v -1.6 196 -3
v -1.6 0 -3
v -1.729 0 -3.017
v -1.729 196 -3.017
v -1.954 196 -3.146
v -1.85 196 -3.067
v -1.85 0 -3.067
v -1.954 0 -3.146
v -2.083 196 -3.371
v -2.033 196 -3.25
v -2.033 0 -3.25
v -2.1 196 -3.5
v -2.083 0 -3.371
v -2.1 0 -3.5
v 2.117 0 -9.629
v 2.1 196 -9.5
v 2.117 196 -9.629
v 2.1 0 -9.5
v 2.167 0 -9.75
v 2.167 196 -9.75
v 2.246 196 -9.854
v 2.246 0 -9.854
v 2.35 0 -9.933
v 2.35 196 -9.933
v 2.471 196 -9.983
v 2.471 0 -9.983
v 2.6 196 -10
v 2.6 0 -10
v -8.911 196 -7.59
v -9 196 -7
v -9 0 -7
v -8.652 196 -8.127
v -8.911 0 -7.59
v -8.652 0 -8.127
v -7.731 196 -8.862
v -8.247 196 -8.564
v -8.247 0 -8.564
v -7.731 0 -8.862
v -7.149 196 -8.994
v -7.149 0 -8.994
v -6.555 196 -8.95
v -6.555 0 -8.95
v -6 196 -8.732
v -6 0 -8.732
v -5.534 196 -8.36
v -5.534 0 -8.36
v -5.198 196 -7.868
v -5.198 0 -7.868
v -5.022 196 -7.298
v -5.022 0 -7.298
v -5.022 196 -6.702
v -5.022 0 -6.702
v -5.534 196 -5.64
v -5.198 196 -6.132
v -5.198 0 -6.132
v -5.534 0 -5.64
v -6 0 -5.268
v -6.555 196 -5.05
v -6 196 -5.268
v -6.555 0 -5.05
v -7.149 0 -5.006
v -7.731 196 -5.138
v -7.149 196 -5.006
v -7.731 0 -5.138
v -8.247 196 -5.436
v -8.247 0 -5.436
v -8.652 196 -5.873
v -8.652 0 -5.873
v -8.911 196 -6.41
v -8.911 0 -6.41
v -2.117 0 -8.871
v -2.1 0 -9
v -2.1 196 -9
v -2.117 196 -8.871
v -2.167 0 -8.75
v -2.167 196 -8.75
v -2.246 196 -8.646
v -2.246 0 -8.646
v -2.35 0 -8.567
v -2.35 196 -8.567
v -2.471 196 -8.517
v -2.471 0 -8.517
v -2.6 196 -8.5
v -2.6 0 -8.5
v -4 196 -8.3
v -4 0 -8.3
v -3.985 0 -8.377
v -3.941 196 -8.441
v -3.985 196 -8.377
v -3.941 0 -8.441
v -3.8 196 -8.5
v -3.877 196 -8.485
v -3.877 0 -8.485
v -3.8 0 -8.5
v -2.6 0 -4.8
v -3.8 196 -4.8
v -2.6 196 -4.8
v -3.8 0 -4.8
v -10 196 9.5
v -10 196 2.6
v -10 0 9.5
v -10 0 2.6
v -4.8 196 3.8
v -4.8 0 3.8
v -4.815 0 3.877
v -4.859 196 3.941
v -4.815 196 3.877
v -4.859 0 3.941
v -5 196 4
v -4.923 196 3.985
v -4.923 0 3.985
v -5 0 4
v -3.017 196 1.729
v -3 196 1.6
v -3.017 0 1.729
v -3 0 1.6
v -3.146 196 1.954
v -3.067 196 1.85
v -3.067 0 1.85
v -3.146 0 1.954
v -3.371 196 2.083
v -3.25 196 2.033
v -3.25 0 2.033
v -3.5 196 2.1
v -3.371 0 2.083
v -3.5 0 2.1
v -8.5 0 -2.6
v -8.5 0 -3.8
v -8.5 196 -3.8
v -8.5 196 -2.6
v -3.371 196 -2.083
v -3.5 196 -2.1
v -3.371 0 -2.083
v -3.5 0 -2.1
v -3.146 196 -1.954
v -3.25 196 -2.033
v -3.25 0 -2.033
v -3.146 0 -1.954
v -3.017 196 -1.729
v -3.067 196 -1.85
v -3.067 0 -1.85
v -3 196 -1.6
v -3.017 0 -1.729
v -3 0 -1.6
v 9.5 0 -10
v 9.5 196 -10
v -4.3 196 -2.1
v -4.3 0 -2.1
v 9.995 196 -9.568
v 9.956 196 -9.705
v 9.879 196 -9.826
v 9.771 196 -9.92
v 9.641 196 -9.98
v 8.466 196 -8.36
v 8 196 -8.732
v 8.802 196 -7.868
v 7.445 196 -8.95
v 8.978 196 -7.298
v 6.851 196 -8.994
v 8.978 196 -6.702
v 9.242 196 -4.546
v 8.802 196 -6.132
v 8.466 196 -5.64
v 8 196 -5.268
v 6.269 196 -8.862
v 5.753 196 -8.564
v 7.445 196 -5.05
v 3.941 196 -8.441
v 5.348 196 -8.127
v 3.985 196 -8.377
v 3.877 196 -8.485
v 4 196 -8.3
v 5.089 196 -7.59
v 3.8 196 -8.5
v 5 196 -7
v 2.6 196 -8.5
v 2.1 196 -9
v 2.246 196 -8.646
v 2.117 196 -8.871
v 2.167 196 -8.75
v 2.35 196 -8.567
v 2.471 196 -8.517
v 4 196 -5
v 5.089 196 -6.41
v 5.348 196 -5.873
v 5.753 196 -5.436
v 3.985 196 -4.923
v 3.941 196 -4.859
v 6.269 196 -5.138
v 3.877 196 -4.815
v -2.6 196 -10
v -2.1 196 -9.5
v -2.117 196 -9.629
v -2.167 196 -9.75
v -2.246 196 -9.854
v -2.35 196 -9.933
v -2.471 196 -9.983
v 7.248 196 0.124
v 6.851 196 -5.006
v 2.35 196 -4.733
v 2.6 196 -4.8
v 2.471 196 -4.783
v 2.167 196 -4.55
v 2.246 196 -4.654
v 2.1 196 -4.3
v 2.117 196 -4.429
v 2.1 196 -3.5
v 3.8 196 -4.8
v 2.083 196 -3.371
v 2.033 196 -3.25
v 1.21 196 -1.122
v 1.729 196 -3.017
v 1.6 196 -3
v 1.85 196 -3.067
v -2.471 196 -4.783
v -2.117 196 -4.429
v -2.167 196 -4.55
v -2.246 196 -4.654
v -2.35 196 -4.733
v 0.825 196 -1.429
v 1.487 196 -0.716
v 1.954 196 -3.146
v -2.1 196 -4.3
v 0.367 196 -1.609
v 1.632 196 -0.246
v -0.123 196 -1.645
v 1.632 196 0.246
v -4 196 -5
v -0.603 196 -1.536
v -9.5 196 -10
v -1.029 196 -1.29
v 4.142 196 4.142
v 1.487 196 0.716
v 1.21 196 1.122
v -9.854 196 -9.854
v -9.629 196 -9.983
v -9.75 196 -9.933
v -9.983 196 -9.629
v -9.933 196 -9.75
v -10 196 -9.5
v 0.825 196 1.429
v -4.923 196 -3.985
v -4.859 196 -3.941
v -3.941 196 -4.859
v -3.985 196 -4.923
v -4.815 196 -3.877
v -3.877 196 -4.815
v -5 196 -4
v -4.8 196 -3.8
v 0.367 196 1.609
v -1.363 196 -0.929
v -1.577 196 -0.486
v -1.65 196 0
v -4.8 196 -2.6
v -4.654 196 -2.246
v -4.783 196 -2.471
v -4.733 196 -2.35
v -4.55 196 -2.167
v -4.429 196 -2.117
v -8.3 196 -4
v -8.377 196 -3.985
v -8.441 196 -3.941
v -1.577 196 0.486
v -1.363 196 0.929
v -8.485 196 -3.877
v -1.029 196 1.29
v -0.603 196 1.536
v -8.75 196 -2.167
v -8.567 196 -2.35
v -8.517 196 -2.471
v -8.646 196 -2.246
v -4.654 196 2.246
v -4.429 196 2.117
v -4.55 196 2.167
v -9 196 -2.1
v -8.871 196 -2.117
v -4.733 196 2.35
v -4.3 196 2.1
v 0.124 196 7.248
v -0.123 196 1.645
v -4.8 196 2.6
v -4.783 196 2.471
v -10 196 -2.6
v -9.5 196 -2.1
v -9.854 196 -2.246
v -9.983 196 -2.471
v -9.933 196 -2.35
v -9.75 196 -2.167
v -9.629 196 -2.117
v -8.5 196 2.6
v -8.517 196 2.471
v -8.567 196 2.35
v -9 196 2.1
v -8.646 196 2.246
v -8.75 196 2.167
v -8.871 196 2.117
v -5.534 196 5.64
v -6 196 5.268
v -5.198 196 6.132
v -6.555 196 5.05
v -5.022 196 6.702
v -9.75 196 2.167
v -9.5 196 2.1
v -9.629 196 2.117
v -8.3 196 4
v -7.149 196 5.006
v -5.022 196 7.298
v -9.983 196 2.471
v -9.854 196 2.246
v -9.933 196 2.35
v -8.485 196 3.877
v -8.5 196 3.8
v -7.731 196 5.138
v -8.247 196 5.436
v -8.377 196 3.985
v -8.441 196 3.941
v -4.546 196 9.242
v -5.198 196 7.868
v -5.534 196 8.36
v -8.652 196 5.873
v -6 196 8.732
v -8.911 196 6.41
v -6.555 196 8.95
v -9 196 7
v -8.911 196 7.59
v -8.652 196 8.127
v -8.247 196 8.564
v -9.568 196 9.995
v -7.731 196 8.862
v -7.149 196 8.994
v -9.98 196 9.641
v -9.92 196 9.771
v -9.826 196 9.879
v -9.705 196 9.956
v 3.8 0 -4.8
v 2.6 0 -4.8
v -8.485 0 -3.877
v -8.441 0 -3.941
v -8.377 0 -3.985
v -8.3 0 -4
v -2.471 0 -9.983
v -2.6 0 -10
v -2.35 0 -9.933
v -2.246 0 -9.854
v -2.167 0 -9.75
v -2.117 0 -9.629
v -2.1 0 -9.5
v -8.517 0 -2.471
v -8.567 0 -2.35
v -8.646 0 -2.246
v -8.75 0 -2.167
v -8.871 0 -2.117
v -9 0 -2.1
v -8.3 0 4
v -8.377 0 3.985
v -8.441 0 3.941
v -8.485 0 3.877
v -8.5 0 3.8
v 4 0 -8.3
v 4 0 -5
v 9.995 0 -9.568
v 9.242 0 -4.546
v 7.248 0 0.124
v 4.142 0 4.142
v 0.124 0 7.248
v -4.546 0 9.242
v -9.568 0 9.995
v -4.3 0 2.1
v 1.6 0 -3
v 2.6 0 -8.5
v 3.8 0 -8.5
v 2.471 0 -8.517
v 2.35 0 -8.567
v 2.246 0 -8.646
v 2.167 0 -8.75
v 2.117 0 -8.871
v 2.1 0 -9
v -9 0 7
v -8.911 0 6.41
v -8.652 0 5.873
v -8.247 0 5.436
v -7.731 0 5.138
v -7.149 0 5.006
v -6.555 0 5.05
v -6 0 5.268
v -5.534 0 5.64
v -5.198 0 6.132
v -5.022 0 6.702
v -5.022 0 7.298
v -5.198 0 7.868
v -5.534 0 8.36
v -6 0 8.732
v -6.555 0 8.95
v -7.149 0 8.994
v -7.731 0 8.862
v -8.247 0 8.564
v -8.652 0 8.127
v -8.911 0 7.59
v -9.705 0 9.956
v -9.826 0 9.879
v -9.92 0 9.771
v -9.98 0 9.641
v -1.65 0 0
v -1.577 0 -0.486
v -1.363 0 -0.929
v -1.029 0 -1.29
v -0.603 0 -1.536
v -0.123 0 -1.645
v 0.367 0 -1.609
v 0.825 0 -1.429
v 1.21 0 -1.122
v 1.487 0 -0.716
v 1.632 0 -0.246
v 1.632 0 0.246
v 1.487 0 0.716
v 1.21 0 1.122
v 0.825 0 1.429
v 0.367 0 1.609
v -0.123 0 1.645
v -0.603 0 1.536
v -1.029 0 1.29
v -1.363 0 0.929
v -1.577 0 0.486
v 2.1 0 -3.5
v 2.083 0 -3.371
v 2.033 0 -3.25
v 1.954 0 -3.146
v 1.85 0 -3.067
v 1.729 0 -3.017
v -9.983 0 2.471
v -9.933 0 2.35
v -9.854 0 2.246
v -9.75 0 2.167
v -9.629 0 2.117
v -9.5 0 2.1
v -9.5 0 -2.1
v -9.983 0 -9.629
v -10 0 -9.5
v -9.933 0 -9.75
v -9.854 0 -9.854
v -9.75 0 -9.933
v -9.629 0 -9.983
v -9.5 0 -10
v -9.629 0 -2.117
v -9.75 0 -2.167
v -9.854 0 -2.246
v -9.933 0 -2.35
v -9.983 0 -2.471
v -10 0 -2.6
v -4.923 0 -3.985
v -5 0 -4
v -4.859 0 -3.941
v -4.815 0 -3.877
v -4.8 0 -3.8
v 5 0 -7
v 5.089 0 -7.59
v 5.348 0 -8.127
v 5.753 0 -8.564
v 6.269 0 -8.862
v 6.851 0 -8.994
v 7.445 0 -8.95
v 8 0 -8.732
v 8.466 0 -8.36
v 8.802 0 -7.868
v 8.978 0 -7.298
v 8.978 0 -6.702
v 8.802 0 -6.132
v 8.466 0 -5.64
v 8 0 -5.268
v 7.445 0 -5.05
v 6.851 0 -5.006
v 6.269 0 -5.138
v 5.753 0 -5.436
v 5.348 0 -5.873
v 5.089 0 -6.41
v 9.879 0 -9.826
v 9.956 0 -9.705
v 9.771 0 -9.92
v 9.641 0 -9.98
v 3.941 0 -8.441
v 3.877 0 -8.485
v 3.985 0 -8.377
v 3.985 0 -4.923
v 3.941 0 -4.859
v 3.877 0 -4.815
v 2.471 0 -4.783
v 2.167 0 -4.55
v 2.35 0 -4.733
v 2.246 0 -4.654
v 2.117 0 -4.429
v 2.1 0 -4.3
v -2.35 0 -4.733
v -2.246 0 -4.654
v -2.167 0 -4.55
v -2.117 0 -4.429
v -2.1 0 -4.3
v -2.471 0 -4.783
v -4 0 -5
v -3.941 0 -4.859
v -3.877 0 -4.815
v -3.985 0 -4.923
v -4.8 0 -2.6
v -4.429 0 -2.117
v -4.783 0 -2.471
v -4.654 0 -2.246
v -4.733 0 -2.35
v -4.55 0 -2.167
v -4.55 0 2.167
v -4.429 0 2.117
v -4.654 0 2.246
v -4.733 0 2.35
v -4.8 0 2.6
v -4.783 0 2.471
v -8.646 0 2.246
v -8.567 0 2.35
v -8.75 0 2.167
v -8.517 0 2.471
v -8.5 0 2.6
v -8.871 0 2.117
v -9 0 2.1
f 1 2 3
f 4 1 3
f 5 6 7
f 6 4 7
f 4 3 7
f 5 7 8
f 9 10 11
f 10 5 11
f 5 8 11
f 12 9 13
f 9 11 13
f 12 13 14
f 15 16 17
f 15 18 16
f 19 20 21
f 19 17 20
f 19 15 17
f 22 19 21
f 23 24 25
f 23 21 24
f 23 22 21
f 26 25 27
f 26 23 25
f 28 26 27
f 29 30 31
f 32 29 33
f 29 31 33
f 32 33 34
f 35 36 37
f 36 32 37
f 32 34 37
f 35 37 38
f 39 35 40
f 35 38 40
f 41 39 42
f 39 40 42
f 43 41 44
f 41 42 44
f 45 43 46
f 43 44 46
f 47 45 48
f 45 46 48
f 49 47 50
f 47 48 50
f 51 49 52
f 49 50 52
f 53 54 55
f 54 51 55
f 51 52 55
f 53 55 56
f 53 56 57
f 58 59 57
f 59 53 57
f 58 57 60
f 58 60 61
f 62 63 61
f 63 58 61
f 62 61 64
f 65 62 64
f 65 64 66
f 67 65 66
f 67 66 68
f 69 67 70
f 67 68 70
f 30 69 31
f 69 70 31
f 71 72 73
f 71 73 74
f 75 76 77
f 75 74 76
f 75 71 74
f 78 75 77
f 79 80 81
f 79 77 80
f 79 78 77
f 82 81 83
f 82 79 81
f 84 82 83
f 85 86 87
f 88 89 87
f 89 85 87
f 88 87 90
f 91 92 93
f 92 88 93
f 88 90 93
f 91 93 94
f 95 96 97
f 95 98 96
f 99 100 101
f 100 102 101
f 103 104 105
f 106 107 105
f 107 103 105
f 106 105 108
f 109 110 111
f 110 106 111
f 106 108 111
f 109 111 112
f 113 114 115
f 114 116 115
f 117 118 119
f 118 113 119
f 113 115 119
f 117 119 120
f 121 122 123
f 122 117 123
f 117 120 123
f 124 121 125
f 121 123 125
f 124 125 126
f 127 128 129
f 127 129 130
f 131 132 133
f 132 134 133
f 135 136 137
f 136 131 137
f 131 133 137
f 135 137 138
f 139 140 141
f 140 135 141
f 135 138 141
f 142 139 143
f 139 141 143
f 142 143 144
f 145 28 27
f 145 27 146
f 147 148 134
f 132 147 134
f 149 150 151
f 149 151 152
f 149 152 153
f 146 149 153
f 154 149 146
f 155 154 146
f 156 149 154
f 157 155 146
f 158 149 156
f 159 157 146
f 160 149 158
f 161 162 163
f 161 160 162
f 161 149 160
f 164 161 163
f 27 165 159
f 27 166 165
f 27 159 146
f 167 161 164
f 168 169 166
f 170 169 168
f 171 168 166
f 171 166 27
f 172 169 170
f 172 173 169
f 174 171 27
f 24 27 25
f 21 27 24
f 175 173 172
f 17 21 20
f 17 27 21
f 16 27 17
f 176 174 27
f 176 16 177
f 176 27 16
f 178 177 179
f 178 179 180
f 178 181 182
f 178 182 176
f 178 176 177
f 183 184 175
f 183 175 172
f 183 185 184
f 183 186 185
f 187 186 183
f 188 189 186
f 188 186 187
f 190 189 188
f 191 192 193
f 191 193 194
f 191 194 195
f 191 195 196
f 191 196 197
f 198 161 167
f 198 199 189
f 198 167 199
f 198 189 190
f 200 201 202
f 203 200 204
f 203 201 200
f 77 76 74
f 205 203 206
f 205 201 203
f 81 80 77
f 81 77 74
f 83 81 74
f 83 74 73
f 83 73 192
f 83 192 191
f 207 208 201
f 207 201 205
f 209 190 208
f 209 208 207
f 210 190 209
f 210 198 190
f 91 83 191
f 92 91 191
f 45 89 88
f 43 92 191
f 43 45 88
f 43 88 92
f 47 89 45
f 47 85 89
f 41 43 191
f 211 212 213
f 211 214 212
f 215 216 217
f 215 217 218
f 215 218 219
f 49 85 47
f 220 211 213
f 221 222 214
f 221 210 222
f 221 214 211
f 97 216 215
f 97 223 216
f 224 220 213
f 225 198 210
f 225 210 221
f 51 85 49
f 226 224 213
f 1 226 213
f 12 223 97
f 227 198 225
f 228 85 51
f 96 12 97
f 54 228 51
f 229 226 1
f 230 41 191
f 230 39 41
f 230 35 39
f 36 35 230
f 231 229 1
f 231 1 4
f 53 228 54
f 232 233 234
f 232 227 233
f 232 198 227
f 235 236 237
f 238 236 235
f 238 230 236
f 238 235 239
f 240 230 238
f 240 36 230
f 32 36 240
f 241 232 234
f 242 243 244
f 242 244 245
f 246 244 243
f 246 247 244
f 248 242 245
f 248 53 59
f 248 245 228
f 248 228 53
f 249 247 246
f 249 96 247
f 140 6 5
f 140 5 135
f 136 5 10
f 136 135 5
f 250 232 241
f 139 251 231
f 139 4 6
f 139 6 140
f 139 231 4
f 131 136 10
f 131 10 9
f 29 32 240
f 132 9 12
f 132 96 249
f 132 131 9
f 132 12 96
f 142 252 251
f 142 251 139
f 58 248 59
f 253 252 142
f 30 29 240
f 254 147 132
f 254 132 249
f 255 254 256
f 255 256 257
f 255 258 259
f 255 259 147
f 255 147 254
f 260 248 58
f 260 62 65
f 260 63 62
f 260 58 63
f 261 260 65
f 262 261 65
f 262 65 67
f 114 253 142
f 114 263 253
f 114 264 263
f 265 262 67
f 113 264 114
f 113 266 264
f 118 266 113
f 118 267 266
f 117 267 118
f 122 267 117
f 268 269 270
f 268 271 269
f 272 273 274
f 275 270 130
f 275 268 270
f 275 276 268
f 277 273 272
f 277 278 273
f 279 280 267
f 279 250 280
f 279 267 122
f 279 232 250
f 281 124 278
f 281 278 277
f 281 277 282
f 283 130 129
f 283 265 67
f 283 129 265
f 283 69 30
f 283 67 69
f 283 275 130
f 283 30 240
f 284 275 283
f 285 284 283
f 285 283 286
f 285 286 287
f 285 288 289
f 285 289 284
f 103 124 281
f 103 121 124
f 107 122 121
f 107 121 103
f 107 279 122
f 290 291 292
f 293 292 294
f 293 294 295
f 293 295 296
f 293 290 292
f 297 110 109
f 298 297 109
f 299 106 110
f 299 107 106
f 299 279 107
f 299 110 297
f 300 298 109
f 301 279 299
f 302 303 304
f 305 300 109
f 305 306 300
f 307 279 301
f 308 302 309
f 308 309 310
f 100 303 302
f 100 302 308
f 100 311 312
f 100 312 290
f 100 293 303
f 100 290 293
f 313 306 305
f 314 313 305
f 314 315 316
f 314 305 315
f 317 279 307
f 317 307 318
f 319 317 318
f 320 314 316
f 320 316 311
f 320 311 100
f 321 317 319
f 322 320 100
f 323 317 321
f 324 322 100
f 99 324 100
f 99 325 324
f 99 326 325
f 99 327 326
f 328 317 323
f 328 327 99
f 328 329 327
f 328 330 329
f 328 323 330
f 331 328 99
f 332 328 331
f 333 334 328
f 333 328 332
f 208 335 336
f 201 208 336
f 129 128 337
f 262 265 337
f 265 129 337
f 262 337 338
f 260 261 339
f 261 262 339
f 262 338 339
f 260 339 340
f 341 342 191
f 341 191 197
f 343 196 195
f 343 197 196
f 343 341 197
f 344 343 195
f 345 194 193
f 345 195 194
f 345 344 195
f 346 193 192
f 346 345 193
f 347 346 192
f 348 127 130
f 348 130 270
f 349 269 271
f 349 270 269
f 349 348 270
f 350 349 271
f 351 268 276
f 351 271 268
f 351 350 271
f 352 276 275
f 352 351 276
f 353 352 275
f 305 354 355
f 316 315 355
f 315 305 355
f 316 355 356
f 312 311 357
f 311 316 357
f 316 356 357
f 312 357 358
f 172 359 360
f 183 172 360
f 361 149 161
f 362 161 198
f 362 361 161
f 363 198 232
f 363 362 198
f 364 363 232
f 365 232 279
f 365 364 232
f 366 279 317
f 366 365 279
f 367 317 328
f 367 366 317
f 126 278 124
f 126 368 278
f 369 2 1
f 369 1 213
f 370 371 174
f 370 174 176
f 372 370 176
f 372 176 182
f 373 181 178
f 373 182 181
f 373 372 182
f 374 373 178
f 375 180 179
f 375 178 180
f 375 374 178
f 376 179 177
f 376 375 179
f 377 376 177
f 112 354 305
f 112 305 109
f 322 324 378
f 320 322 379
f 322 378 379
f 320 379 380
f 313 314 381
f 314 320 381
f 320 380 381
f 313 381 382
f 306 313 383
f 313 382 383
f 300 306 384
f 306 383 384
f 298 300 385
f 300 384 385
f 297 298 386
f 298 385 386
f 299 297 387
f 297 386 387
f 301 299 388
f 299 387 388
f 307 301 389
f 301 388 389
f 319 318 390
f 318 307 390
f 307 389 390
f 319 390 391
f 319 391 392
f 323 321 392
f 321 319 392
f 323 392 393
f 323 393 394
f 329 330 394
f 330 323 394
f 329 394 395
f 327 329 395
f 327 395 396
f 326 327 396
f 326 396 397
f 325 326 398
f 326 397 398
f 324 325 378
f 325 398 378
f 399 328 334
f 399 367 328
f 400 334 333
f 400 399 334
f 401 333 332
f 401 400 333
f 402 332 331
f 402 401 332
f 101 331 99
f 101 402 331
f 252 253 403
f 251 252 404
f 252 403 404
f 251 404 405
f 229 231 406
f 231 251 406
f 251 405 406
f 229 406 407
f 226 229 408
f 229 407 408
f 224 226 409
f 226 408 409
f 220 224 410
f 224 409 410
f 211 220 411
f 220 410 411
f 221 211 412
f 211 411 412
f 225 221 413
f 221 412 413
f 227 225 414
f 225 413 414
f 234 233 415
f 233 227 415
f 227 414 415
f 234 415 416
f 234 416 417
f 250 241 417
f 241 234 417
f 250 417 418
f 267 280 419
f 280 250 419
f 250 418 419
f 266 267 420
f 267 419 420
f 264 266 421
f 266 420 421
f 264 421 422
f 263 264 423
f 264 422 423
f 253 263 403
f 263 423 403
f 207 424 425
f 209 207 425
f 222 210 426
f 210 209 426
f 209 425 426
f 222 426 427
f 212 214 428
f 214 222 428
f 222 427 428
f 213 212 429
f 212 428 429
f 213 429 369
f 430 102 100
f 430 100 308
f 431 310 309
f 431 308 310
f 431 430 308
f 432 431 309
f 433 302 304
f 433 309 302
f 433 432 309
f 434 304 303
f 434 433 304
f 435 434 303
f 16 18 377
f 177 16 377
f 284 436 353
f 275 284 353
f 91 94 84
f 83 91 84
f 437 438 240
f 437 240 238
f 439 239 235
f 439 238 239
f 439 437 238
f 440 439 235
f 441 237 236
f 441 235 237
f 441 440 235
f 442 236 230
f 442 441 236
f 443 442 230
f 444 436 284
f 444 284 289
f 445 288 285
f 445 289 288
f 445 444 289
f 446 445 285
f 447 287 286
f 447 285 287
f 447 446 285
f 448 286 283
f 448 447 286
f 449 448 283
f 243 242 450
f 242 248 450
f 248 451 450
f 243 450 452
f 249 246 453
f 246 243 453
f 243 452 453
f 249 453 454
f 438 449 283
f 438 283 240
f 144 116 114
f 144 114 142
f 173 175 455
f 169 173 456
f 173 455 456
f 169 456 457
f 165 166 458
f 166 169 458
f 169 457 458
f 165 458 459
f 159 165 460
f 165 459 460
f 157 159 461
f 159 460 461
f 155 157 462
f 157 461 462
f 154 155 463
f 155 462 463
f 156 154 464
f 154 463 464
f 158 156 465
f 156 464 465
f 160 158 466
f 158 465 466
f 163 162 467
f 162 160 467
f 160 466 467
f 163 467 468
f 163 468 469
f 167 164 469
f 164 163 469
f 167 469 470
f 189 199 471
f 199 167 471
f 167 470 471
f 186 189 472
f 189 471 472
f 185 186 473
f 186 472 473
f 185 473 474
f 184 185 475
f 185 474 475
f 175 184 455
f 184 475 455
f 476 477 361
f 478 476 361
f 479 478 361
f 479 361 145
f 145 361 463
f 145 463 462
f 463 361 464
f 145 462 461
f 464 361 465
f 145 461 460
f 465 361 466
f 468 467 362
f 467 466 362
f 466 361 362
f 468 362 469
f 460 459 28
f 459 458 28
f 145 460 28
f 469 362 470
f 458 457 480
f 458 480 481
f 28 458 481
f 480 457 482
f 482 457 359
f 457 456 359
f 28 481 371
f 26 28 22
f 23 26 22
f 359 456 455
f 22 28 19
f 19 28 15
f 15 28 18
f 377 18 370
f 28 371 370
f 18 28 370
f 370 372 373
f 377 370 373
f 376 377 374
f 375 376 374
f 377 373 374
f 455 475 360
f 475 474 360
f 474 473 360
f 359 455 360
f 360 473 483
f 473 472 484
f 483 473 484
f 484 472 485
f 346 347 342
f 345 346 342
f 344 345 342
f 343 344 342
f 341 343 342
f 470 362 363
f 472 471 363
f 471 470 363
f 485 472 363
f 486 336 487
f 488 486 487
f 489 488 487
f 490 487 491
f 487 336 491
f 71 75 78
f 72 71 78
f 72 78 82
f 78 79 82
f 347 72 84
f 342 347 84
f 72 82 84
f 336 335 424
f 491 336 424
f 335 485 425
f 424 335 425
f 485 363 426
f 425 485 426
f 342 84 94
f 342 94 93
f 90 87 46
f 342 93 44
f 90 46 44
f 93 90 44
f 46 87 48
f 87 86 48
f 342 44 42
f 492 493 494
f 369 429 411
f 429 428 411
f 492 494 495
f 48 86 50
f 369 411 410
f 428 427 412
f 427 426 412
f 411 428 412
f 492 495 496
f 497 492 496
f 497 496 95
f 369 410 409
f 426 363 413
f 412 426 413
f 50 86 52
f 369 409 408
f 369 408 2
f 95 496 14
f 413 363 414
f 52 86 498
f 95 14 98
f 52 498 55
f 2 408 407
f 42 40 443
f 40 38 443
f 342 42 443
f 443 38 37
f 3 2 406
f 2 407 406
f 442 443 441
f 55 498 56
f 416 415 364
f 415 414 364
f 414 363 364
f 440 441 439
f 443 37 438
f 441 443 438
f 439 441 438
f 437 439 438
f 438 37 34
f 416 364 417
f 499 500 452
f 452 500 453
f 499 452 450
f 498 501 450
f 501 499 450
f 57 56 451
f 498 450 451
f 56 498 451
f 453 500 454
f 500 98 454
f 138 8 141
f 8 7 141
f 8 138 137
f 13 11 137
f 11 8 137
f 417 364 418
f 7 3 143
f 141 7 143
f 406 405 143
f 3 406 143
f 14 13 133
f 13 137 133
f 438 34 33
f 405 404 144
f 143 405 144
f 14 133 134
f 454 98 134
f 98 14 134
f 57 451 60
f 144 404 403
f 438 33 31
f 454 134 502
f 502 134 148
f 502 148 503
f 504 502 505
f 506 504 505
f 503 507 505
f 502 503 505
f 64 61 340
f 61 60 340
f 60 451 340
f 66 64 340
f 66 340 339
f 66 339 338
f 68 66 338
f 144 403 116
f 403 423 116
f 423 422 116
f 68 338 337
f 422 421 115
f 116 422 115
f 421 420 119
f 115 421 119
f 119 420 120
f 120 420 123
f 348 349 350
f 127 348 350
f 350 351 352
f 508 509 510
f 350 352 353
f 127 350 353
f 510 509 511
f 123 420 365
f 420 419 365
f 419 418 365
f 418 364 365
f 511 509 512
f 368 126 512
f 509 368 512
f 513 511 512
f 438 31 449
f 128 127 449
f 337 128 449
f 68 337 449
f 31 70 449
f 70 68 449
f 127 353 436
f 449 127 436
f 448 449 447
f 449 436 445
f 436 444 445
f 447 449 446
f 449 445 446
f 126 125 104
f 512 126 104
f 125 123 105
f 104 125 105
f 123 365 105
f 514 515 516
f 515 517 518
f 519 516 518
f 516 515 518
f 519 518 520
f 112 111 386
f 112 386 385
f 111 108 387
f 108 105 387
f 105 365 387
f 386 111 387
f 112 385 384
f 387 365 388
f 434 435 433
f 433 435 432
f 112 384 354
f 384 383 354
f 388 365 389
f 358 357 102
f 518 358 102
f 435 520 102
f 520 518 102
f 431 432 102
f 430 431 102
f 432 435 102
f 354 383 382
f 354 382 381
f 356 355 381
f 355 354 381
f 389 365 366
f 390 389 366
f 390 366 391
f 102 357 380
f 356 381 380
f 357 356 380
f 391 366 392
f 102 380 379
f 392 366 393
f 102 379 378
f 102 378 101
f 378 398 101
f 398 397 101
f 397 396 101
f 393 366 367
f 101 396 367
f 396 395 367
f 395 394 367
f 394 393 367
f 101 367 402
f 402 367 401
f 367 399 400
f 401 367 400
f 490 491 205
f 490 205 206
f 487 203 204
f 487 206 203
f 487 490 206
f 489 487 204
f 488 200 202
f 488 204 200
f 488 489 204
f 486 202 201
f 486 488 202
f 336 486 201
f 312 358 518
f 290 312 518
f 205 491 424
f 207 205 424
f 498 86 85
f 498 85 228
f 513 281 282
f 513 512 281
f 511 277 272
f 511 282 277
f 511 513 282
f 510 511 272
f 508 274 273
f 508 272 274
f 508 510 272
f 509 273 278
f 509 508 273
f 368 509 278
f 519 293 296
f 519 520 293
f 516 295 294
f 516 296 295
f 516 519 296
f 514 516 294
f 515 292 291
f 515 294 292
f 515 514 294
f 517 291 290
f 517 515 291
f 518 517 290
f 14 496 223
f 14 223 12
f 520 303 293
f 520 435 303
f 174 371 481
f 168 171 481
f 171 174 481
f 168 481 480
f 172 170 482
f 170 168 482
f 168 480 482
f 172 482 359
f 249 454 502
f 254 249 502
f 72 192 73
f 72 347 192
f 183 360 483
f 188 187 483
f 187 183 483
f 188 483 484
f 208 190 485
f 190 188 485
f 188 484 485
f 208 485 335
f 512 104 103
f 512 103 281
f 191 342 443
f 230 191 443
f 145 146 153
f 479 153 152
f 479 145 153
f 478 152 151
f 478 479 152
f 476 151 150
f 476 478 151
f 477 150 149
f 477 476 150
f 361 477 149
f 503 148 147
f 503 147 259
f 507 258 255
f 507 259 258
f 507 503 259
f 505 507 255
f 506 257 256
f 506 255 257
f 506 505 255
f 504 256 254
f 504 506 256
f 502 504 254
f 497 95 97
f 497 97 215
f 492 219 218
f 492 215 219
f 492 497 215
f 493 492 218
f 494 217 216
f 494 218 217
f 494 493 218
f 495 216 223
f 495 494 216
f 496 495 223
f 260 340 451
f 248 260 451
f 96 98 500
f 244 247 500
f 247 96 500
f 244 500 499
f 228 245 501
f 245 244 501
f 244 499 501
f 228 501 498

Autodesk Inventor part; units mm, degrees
ref_plane "YZ Plane" through (0, 0, 0) normal (1, 0, 0) x (0, 1, 0)
ref_plane "開始平面" through (0, 0, 0) normal (0, 1, 0) x (-1, 0, 0)
ref_plane "終了平面" through (0, 196, 0) normal (0, 1, 0) x (-1, 0, 0)
sketch "スケッチ" plane through (0, 0, 0) normal (0, 1, 0) x (-1, 0, 0)
  line L0 (8.5, -3.8) -> (8.5, -2.6)
  line L1 (4, -8.3) -> (4, -5)
  circle A0 centre (7, -7) radius 2
  line L2 (10, -2.6) -> (10, -9.5)
  line L3 (2.6, -10) -> (9.5, -10)
  line L4 (2.1, -9.5) -> (2.1, -9)
  line L5 (8.5, -2.1) -> (8.5, -4)
  line L6 (3.8, -4.8) -> (2.6, -4.8)
  line L7 (4.8, -3.8) -> (4.8, -2.6)
  arc A1 (2.1, -4.3) -> (2.6, -4.8) centre (2.6, -4.3) ccw
  arc A2 (2.6, -8.5) -> (2.1, -9) centre (2.6, -9) ccw
  arc A3 (3.8, -8.5) -> (4, -8.3) centre (3.8, -8.3) ccw
  arc A4 (4, -5) -> (3.8, -4.8) centre (3.8, -5) ccw
  arc A5 (2.1, -3.5) -> (1.6, -3) centre (1.6, -3.5) ccw
  arc A6 (2.1, -9.5) -> (2.6, -10) centre (2.6, -9.5) ccw
  arc A7 (9.5, -10) -> (10, -9.5) centre (9.5, -9.5) ccw
  arc A8 (10, -2.6) -> (9.5, -2.1) centre (9.5, -2.6) ccw
  arc A9 (9, -2.1) -> (8.5, -2.6) centre (9, -2.6) ccw
  arc A10 (8.3, -4) -> (8.5, -3.8) centre (8.3, -3.8) ccw
  arc A11 (4.8, -3.8) -> (5, -4) centre (5, -3.8) ccw
  line L8 (4.3, -2.1) -> (3.5, -2.1)
  arc A12 (4.8, -2.6) -> (4.3, -2.1) centre (4.3, -2.6) ccw
  arc A13 (3, -1.6) -> (3.5, -2.1) centre (3.5, -1.6) ccw
  line L9 (2.1, -4.3) -> (2.1, -3.5)
  line L10 (3.8, -8.5) -> (2.6, -8.5)
  line L11 (9.5, -2.1) -> (9, -2.1)
  line L12 (8.3, -4) -> (5, -4)
  circle A14 centre (0, 0) radius 1.65
  arc A15 (8.5, 2.6) -> (9, 2.1) centre (9, 2.6) ccw
  line L13 (8.5, 3.8) -> (8.5, 2.6)
  arc A16 (8.5, 3.8) -> (8.3, 4) centre (8.3, 3.8) ccw
  line L14 (8.3, 4) -> (5, 4)
  line L15 (10, 2.6) -> (10, 9.5)
  arc A17 (10, 9.5) -> (9.5, 10) centre (9.5, 9.5) ccw
  circle A18 centre (7, 7) radius 2
  line L16 (4, 8.3) -> (4, 5)
  line L17 (2.6, 10) -> (9.5, 10)
  line L18 (9.5, 2.1) -> (9, 2.1)
  arc A19 (9.5, 2.1) -> (10, 2.6) centre (9.5, 2.6) ccw
  line L19 (3.8, 8.5) -> (2.6, 8.5)
  line L20 (4.8, 3.8) -> (4.8, 2.6)
  arc A20 (4.3, 2.1) -> (4.8, 2.6) centre (4.3, 2.6) ccw
  line L21 (2.1, 8.5) -> (4, 8.5)
  arc A21 (4, 8.3) -> (3.8, 8.5) centre (3.8, 8.3) ccw
  arc A22 (2.1, 9) -> (2.6, 8.5) centre (2.6, 9) ccw
  arc A23 (2.6, 10) -> (2.1, 9.5) centre (2.6, 9.5) ccw
  line L22 (2.1, 9.5) -> (2.1, 9)
  arc A24 (1.6, 3) -> (2.1, 3.5) centre (1.6, 3.5) ccw
  line L23 (3.8, 4.8) -> (2.6, 4.8)
  arc A25 (5, 4) -> (4.8, 3.8) centre (5, 3.8) ccw
  arc A26 (3.8, 4.8) -> (4, 5) centre (3.8, 5) ccw
  line L24 (4.3, 2.1) -> (3.5, 2.1)
  arc A27 (2.6, 4.8) -> (2.1, 4.3) centre (2.6, 4.3) ccw
  line L25 (2.1, 4.3) -> (2.1, 3.5)
  arc A28 (3.5, 2.1) -> (3, 1.6) centre (3.5, 1.6) ccw
  arc A29 (-2.6, 8.5) -> (-2.1, 9) centre (-2.6, 9) ccw
  line L26 (-3.8, 8.5) -> (-2.6, 8.5)
  arc A30 (-3.8, 8.5) -> (-4, 8.3) centre (-3.8, 8.3) ccw
  line L27 (-4, 8.3) -> (-4, 5)
  line L28 (-2.6, 10) -> (-9.5, 10)
  arc A31 (-9.5, 10) -> (-10, 9.5) centre (-9.5, 9.5) ccw
  circle A32 centre (-7, 7) radius 2
  line L29 (-8.3, 4) -> (-5, 4)
  line L30 (-10, 2.6) -> (-10, 9.5)
  line L31 (-2.1, 9.5) -> (-2.1, 9)
  arc A33 (-2.1, 9.5) -> (-2.6, 10) centre (-2.6, 9.5) ccw
  line L32 (-8.5, 3.8) -> (-8.5, 2.6)
  line L33 (-3.8, 4.8) -> (-2.6, 4.8)
  arc A34 (-2.1, 4.3) -> (-2.6, 4.8) centre (-2.6, 4.3) ccw
  line L34 (-8.5, 2.1) -> (-8.5, 4)
  arc A35 (-8.3, 4) -> (-8.5, 3.8) centre (-8.3, 3.8) ccw
  arc A36 (-9, 2.1) -> (-8.5, 2.6) centre (-9, 2.6) ccw
  arc A37 (-10, 2.6) -> (-9.5, 2.1) centre (-9.5, 2.6) ccw
  line L35 (-9.5, 2.1) -> (-9, 2.1)
  arc A38 (-3, 1.6) -> (-3.5, 2.1) centre (-3.5, 1.6) ccw
  line L36 (-4.8, 3.8) -> (-4.8, 2.6)
  arc A39 (-4, 5) -> (-3.8, 4.8) centre (-3.8, 5) ccw
  arc A40 (-4.8, 3.8) -> (-5, 4) centre (-5, 3.8) ccw
  line L37 (-2.1, 4.3) -> (-2.1, 3.5)
  arc A41 (-4.8, 2.6) -> (-4.3, 2.1) centre (-4.3, 2.6) ccw
  line L38 (-4.3, 2.1) -> (-3.5, 2.1)
  arc A42 (-2.1, 3.5) -> (-1.6, 3) centre (-1.6, 3.5) ccw
  arc A43 (-8.5, -2.6) -> (-9, -2.1) centre (-9, -2.6) ccw
  line L39 (-8.5, -3.8) -> (-8.5, -2.6)
  arc A44 (-8.5, -3.8) -> (-8.3, -4) centre (-8.3, -3.8) ccw
  line L40 (-8.3, -4) -> (-5, -4)
  line L41 (-10, -2.6) -> (-10, -9.5)
  arc A45 (-10, -9.5) -> (-9.5, -10) centre (-9.5, -9.5) ccw
  circle A46 centre (-7, -7) radius 2
  line L42 (-4, -8.3) -> (-4, -5)
  line L43 (-2.6, -10) -> (-9.5, -10)
  line L44 (-9.5, -2.1) -> (-9, -2.1)
  arc A47 (-9.5, -2.1) -> (-10, -2.6) centre (-9.5, -2.6) ccw
  line L45 (-3.8, -8.5) -> (-2.6, -8.5)
  line L46 (-4.8, -3.8) -> (-4.8, -2.6)
  arc A48 (-4.3, -2.1) -> (-4.8, -2.6) centre (-4.3, -2.6) ccw
  line L47 (-2.1, -8.5) -> (-4, -8.5)
  arc A49 (-4, -8.3) -> (-3.8, -8.5) centre (-3.8, -8.3) ccw
  arc A50 (-2.1, -9) -> (-2.6, -8.5) centre (-2.6, -9) ccw
  arc A51 (-2.6, -10) -> (-2.1, -9.5) centre (-2.6, -9.5) ccw
  line L48 (-2.1, -9.5) -> (-2.1, -9)
  arc A52 (-1.6, -3) -> (-2.1, -3.5) centre (-1.6, -3.5) ccw
  line L49 (-3.8, -4.8) -> (-2.6, -4.8)
  arc A53 (-5, -4) -> (-4.8, -3.8) centre (-5, -3.8) ccw
  arc A54 (-3.8, -4.8) -> (-4, -5) centre (-3.8, -5) ccw
  line L50 (-4.3, -2.1) -> (-3.5, -2.1)
  arc A55 (-2.6, -4.8) -> (-2.1, -4.3) centre (-2.6, -4.3) ccw
  line L51 (-2.1, -4.3) -> (-2.1, -3.5)
  arc A56 (-3.5, -2.1) -> (-3, -1.6) centre (-3.5, -1.6) ccw
  line L52 (1.6, -3) -> (-1.6, -3)
  line L53 (-3, -1.6) -> (-3, 1.6)
  line L54 (-1.6, 3) -> (1.6, 3)
  line L55 (3, 1.6) -> (3, -1.6)
  point P0 (2.1, -10)
  point P1 (10, 2.1)
  point P2 (-2.1, 10)
  point P3 (-10, -2.1)
  dimension "d12" = 4
  dimension "d14" = 3.7
  dimension "d16" = 0.5
  dimension "d17" = 0.5
  dimension "d18" = 0.2
  dimension "d19" = 0.5
  dimension "d20" = 0.5
  dimension "d24" = 0.5
  dimension "d25" = 0.2
  dimension "d28" = 0.5
  dimension "d31" = 1.5
  dimension "d36" = 3.7
  dimension "d37" = 1.5
  dimension "d58" = 3.3
  dimension "d65" = 10
  dimension "d67" = 2.1
  dimension "d68" = 2.1
  dimension "d69" = 1.9
  dimension "d70" = 7
  dimension "d72" = 2.1
  dimension "d73" = 2.1
  dimension "d74" = 1.9
  dimension "d75" = 7
  dimension "d76" = 10
  dimension "d80" = 360
  dimension "d82" = 3
extrude "ボディ" add sketch "スケッチ" along normal up to surface (196 mm away) from surface at 0
sketch "スケッチ4" plane through (0, 0, 0) normal (0, 1, 0) x (-1, 0, 0)
  line L0 (0, 0) -> (10, 0)
ref_plane "作業平面4" through (0, 0, 0) normal (0, 0, -1) x (-1, 0, 0)
sketch "スケッチ5" plane through (0, 0, 0) normal (0, 0, -1) x (-1, 0, 0)
  line L0 (-2, 0) -> (12, 0)
  line L1 (-2, 196) -> (12, 196)
sketch "スケッチ9" plane through (2.6, 0, -10) normal (0, -1, 0) x (1, 0, 0)
  circle A0 centre (4.4, 3) radius 2 projected
  circle A1 centre (4.4, 17) radius 2 projected
  circle A2 centre (-9.6, 17) radius 2 projected
  circle A3 centre (-9.6, 3) radius 2 projected
  circle A4 centre (-2.6, 10) radius 1.65 projected
  arc A5 (-5.2, 5.2) -> (-4.7, 5.7) centre (-5.2, 5.7) ccw projected
  line L0 (-4.7, 5.7) -> (-4.7, 6.5) projected
  arc A6 (-4.2, 7) -> (-4.7, 6.5) centre (-4.2, 6.5) ccw projected
  line L1 (-4.2, 7) -> (-1, 7) projected
  arc A7 (-0.5, 6.5) -> (-1, 7) centre (-1, 6.5) ccw projected
  line L2 (-0.5, 6.5) -> (-0.5, 5.7) projected
  arc A8 (-0.5, 5.7) -> (0, 5.2) centre (0, 5.7) ccw projected
  line L3 (0, 5.2) -> (1.2, 5.2) projected
  arc A9 (1.4, 5) -> (1.2, 5.2) centre (1.2, 5) ccw projected
  line L4 (1.4, 5) -> (1.4, 1.7) projected
  arc A10 (1.2, 1.5) -> (1.4, 1.7) centre (1.2, 1.7) ccw projected
  line L5 (1.2, 1.5) -> (0, 1.5) projected
  arc A11 (0, 1.5) -> (-0.5, 1) centre (0, 1) ccw projected
  line L6 (-0.5, 1) -> (-0.5, 0.5) projected
  arc A12 (-0.5, 0.5) -> (0, 0) centre (0, 0.5) ccw projected
  line L7 (0, 0) -> (6.9, 0) projected
  arc A13 (6.9, 0) -> (7.4, 0.5) centre (6.9, 0.5) ccw projected
  line L8 (7.4, 0.5) -> (7.4, 7.4) projected
  arc A14 (7.4, 7.4) -> (6.9, 7.9) centre (6.9, 7.4) ccw projected
  line L9 (6.9, 7.9) -> (6.4, 7.9) projected
  arc A15 (6.4, 7.9) -> (5.9, 7.4) centre (6.4, 7.4) ccw projected
  line L10 (5.9, 7.4) -> (5.9, 6.2) projected
  arc A16 (5.7, 6) -> (5.9, 6.2) centre (5.7, 6.2) ccw projected
  line L11 (5.7, 6) -> (2.4, 6) projected
  arc A17 (2.2, 6.2) -> (2.4, 6) centre (2.4, 6.2) ccw projected
  line L12 (2.2, 6.2) -> (2.2, 7.4) projected
  arc A18 (2.2, 7.4) -> (1.7, 7.9) centre (1.7, 7.4) ccw projected
  line L13 (1.7, 7.9) -> (0.9, 7.9) projected
  arc A19 (0.4, 8.4) -> (0.9, 7.9) centre (0.9, 8.4) ccw projected
  line L14 (0.4, 8.4) -> (0.4, 11.6) projected
  arc A20 (0.9, 12.1) -> (0.4, 11.6) centre (0.9, 11.6) ccw projected
  line L15 (0.9, 12.1) -> (1.7, 12.1) projected
  arc A21 (1.7, 12.1) -> (2.2, 12.6) centre (1.7, 12.6) ccw projected
  line L16 (2.2, 12.6) -> (2.2, 13.8) projected
  arc A22 (2.4, 14) -> (2.2, 13.8) centre (2.4, 13.8) ccw projected
  line L17 (2.4, 14) -> (5.7, 14) projected
  arc A23 (5.9, 13.8) -> (5.7, 14) centre (5.7, 13.8) ccw projected
  line L18 (5.9, 13.8) -> (5.9, 12.6) projected
  arc A24 (5.9, 12.6) -> (6.4, 12.1) centre (6.4, 12.6) ccw projected
  line L19 (6.4, 12.1) -> (6.9, 12.1) projected
  arc A25 (6.9, 12.1) -> (7.4, 12.6) centre (6.9, 12.6) ccw projected
  line L20 (7.4, 12.6) -> (7.4, 19.5) projected
  arc A26 (7.4, 19.5) -> (6.9, 20) centre (6.9, 19.5) ccw projected
  line L21 (6.9, 20) -> (0, 20) projected
  arc A27 (0, 20) -> (-0.5, 19.5) centre (0, 19.5) ccw projected
  line L22 (-0.5, 19.5) -> (-0.5, 19) projected
  arc A28 (-0.5, 19) -> (0, 18.5) centre (0, 19) ccw projected
  line L23 (0, 18.5) -> (1.2, 18.5) projected
  arc A29 (1.4, 18.3) -> (1.2, 18.5) centre (1.2, 18.3) ccw projected
  line L24 (1.4, 18.3) -> (1.4, 15) projected
  arc A30 (1.2, 14.8) -> (1.4, 15) centre (1.2, 15) ccw projected
  line L25 (1.2, 14.8) -> (0, 14.8) projected
  arc A31 (0, 14.8) -> (-0.5, 14.3) centre (0, 14.3) ccw projected
  line L26 (-0.5, 14.3) -> (-0.5, 13.5) projected
  arc A32 (-1, 13) -> (-0.5, 13.5) centre (-1, 13.5) ccw projected
  line L27 (-1, 13) -> (-4.2, 13) projected
  arc A33 (-4.7, 13.5) -> (-4.2, 13) centre (-4.2, 13.5) ccw projected
  line L28 (-4.7, 13.5) -> (-4.7, 14.3) projected
  arc A34 (-4.7, 14.3) -> (-5.2, 14.8) centre (-5.2, 14.3) ccw projected
  line L29 (-5.2, 14.8) -> (-6.4, 14.8) projected
  arc A35 (-6.6, 15) -> (-6.4, 14.8) centre (-6.4, 15) ccw projected
  line L30 (-6.6, 15) -> (-6.6, 18.3) projected
  arc A36 (-6.4, 18.5) -> (-6.6, 18.3) centre (-6.4, 18.3) ccw projected
  line L31 (-6.4, 18.5) -> (-5.2, 18.5) projected
  arc A37 (-5.2, 18.5) -> (-4.7, 19) centre (-5.2, 19) ccw projected
  line L32 (-4.7, 19) -> (-4.7, 19.5) projected
  arc A38 (-4.7, 19.5) -> (-5.2, 20) centre (-5.2, 19.5) ccw projected
  line L33 (-5.2, 20) -> (-12.1, 20) projected
  arc A39 (-12.1, 20) -> (-12.6, 19.5) centre (-12.1, 19.5) ccw projected
  line L34 (-12.6, 19.5) -> (-12.6, 12.6) projected
  arc A40 (-12.6, 12.6) -> (-12.1, 12.1) centre (-12.1, 12.6) ccw projected
  line L35 (-12.1, 12.1) -> (-11.6, 12.1) projected
  arc A41 (-11.6, 12.1) -> (-11.1, 12.6) centre (-11.6, 12.6) ccw projected
  line L36 (-11.1, 12.6) -> (-11.1, 13.8) projected
  arc A42 (-10.9, 14) -> (-11.1, 13.8) centre (-10.9, 13.8) ccw projected
  line L37 (-10.9, 14) -> (-7.6, 14) projected
  arc A43 (-7.4, 13.8) -> (-7.6, 14) centre (-7.6, 13.8) ccw projected
  line L38 (-7.4, 13.8) -> (-7.4, 12.6) projected
  arc A44 (-7.4, 12.6) -> (-6.9, 12.1) centre (-6.9, 12.6) ccw projected
  line L39 (-6.9, 12.1) -> (-6.1, 12.1) projected
  arc A45 (-5.6, 11.6) -> (-6.1, 12.1) centre (-6.1, 11.6) ccw projected
  line L40 (-5.6, 11.6) -> (-5.6, 8.4) projected
  arc A46 (-6.1, 7.9) -> (-5.6, 8.4) centre (-6.1, 8.4) ccw projected
  line L41 (-6.1, 7.9) -> (-6.9, 7.9) projected
  arc A47 (-6.9, 7.9) -> (-7.4, 7.4) centre (-6.9, 7.4) ccw projected
  line L42 (-7.4, 7.4) -> (-7.4, 6.2) projected
  arc A48 (-7.6, 6) -> (-7.4, 6.2) centre (-7.6, 6.2) ccw projected
  line L43 (-7.6, 6) -> (-10.9, 6) projected
  arc A49 (-11.1, 6.2) -> (-10.9, 6) centre (-10.9, 6.2) ccw projected
  line L44 (-11.1, 6.2) -> (-11.1, 7.4) projected
  arc A50 (-11.1, 7.4) -> (-11.6, 7.9) centre (-11.6, 7.4) ccw projected
  line L45 (-11.6, 7.9) -> (-12.1, 7.9) projected
  arc A51 (-12.1, 7.9) -> (-12.6, 7.4) centre (-12.1, 7.4) ccw projected
  line L46 (-12.6, 7.4) -> (-12.6, 0.5) projected
  arc A52 (-12.6, 0.5) -> (-12.1, 0) centre (-12.1, 0.5) ccw projected
  line L47 (-12.1, 0) -> (-5.2, 0) projected
  arc A53 (-5.2, 0) -> (-4.7, 0.5) centre (-5.2, 0.5) ccw projected
  line L48 (-4.7, 0.5) -> (-4.7, 1) projected
  arc A54 (-4.7, 1) -> (-5.2, 1.5) centre (-5.2, 1) ccw projected
  line L49 (-5.2, 1.5) -> (-6.4, 1.5) projected
  arc A55 (-6.6, 1.7) -> (-6.4, 1.5) centre (-6.4, 1.7) ccw projected
  line L50 (-6.6, 1.7) -> (-6.6, 5) projected
  arc A56 (-6.4, 5.2) -> (-6.6, 5) centre (-6.4, 5) ccw projected
  line L51 (-6.4, 5.2) -> (-5.2, 5.2) projected
  line L52 (6.9, 20) -> (0, 20) projected
  line L53 (-5.2, 20) -> (0, 20)
  line L54 (7.4, 12.6) -> (7.4, 19.5) projected
  line L55 (7.4, 12.6) -> (7.4, 7.4)
extrude "押し出し7" add sketch "スケッチ9" against normal blind 196 contours A1 | A14 L9 A15 L10 A16 L11 A17 L12 A18 L13 A19 L14 A20 L15 A21 L16 A22 L17 A23 L18 A24 L19 A25 L55 | A27 L22 A28 L23 A29 L24 A30 L25 A31 L26 A32 L27 A33 L28 A34 L29 A35 L30 A36 L31 A37 L32 A38 L53
sketch "スケッチ10" plane through (-9.5, 0, 10) normal (0, -1, 0) x (1, 0, 0)
  line L0 (-0.5, -12.6) -> (-0.5, -19.5) construction
  line L1 (0, -20) -> (6.9, -20) construction
  arc A0 (-0.5, -19.5) -> (0, -20) centre (0, -19.5) ccw construction
  line L2 (-0.5, -19.5) -> (-0.5, -20) construction
  line L3 (-0.5, -20) -> (0, -20) construction
  arc A1 (0, 0) -> (-0.5, -0.5) centre (0, -0.5) ccw projected
  arc A2 (19.4953, -19.5681) -> (-0.0681, -0.0047) centre (-0.5, -20) ccw
  line L4 (19, 0) -> (0, 0) projected
  arc A3 (19.5, -0.5) -> (19, 0) centre (19, -0.5) ccw projected
  line L5 (19.5, -19.5) -> (19.5, -0.5) projected
  arc A4 (19, -20) -> (19.5, -19.5) centre (19, -19.5) ccw projected
  point P0 (9.5, -10)
  dimension "d101" = 20
extrude "押し出し8" cut sketch "スケッチ10" against normal through all
equation "\"d99\" = Length"
equation "\"Length\" = 196"
equation "\"G_OFFSET_START\" = 0"
equation "\"G_OFFSET_END\" = 0"
equation "\"d86\" = Length + G_OFFSET_END"
equation "\"G_L\" = 196"
properties part number "r150" material "アルミニウム 6061"
